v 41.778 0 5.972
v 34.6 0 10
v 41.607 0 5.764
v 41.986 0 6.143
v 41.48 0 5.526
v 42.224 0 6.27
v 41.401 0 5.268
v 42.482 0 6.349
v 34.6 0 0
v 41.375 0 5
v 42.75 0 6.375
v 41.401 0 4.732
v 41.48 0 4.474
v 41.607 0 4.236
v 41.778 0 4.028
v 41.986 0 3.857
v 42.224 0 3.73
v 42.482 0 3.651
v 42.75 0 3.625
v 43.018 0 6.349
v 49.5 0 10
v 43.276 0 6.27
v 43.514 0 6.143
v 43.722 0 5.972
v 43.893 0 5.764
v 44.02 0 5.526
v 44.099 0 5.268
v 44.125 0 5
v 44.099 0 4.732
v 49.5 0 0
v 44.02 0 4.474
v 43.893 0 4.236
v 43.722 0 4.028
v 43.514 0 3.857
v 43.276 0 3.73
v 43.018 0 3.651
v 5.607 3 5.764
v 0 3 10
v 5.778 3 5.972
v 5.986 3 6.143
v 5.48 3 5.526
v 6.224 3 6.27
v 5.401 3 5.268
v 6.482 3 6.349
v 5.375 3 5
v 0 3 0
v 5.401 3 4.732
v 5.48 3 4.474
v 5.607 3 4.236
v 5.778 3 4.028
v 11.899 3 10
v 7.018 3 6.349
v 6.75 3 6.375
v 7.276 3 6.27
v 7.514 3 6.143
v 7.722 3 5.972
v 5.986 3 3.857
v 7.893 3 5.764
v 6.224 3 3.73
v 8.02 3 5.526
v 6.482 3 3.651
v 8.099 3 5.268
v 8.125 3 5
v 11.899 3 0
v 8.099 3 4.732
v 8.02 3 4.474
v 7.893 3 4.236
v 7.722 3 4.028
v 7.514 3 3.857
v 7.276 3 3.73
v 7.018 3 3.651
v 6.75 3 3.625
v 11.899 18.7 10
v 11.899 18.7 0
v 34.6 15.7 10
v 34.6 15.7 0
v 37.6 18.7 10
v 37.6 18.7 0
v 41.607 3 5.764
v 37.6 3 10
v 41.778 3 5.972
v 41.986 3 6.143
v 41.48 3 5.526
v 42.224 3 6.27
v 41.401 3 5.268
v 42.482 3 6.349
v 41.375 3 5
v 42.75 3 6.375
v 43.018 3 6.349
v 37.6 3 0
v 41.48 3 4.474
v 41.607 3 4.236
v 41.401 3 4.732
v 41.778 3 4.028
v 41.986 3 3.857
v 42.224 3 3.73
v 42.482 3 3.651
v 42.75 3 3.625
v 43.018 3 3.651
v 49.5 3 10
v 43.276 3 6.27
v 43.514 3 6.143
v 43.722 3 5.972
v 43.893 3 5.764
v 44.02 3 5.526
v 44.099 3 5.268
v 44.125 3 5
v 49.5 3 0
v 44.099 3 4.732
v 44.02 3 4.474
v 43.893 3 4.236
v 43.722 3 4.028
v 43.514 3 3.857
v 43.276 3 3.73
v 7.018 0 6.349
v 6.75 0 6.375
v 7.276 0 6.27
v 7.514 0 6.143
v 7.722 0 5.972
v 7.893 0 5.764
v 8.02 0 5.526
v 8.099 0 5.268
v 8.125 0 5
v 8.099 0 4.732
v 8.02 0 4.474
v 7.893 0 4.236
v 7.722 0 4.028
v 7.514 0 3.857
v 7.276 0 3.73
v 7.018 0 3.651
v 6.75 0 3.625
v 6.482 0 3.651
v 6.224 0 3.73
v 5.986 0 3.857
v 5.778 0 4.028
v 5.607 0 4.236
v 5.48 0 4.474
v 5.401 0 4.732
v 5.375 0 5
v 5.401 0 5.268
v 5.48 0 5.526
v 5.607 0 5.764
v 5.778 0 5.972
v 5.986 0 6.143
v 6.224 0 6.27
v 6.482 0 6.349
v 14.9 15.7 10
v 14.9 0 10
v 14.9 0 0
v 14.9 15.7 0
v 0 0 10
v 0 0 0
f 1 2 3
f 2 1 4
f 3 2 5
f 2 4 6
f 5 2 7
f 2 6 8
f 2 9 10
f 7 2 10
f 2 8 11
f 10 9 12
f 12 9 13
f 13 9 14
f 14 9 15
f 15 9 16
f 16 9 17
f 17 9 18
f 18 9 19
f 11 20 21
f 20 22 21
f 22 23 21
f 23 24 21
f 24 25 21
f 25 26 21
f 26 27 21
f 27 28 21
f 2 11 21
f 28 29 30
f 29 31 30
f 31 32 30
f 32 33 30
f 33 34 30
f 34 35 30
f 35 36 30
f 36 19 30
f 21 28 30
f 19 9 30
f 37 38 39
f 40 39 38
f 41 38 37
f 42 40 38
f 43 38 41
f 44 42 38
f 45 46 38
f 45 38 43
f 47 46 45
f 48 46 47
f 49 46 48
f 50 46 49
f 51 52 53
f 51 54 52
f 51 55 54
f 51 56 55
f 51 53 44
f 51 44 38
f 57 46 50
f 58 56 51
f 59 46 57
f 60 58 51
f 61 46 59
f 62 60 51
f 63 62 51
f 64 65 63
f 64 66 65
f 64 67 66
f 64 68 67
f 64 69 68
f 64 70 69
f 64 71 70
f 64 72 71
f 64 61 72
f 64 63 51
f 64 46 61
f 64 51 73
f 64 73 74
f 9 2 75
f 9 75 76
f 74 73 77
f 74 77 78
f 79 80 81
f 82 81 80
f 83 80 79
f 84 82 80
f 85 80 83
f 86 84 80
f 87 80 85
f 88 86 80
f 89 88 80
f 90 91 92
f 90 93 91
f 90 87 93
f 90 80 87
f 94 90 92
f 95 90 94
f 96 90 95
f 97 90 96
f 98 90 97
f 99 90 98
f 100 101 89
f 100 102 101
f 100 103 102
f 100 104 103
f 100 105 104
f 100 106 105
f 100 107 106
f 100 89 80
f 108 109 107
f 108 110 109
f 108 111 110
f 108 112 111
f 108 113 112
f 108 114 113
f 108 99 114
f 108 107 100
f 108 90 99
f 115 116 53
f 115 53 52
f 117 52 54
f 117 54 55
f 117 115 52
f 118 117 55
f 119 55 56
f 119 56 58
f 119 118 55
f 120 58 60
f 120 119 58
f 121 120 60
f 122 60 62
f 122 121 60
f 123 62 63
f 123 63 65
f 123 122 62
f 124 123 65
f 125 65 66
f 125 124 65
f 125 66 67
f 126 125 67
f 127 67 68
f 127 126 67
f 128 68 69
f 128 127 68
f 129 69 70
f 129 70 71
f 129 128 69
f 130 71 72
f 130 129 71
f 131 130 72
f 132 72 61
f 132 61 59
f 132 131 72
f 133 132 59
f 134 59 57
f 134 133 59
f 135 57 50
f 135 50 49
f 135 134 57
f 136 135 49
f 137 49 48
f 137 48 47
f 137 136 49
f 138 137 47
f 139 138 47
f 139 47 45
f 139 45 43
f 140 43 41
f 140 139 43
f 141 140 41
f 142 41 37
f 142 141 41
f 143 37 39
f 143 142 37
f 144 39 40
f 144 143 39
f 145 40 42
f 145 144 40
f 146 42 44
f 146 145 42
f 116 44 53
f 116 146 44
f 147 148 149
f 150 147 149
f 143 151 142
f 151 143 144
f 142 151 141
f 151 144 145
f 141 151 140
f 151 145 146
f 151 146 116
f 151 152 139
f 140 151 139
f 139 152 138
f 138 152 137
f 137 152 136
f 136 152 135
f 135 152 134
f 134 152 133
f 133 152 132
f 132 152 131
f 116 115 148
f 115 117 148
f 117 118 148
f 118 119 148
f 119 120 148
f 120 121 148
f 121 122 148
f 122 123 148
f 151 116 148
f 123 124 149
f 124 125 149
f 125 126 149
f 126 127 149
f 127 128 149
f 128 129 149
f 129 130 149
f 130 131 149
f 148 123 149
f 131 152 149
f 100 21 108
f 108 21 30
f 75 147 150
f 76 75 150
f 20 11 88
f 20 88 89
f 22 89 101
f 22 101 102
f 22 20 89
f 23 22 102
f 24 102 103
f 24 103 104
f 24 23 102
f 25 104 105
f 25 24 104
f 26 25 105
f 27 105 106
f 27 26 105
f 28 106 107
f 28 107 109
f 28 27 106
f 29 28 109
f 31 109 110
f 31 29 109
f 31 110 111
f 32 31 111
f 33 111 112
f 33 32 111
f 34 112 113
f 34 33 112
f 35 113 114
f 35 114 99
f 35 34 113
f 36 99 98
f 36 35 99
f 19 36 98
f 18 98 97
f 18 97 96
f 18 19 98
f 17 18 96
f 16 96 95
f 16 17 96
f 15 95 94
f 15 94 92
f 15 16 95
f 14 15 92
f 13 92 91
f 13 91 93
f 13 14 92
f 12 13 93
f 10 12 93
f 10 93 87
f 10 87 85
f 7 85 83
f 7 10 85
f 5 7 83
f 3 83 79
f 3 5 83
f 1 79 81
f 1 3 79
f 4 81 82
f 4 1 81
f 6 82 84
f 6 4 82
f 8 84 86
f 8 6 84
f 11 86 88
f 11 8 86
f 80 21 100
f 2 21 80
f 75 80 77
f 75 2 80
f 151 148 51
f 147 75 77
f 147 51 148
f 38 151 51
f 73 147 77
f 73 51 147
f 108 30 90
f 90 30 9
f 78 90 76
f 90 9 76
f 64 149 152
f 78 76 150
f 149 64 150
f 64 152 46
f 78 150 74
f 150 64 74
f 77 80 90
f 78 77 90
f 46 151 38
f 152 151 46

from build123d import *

# Parameters (mm, degrees)
SKETCH1_W             = 11.9
SKETCH1_H             = 10
SKETCH1_R             = 1.375
BOSS_EXTRUDE1_DEPTH   = 3
SKETCH1_W_2           = 11.89875271
BOSS_EXTRUDE1_2_DEPTH = 3
SKETCH1_4_W           = 3
SKETCH1_4_H           = 10
SKETCH1_4_W_2         = 3.00124729
BOSS_EXTRUDE2_DEPTH   = 18.7
BOSS_EXTRUDE3_REACH   = 42.581
SKETCH3_W             = 10
SKETCH3_H             = 3


with BuildPart() as part:
    # Sketch1 → Boss-Extrude1 (new body)
    with BuildSketch(Plane(origin=(0, 0, 0), x_dir=(1, 0, 0), z_dir=(0, 1, 0))):
        with Locations((43.55, -5)):
            Rectangle(SKETCH1_W, SKETCH1_H)
        with Locations((42.75, -5)):
            Circle(SKETCH1_R, mode=Mode.SUBTRACT)
    extrude(amount=BOSS_EXTRUDE1_DEPTH)



with BuildPart() as body_2:
    # Sketch1 → Boss-Extrude1 2 (new body)
    with BuildSketch(Plane(origin=(0, 0, 0), x_dir=(1, 0, 0), z_dir=(0, 1, 0))):
        with Locations((5.949376355, -5)):
            Rectangle(SKETCH1_W_2, SKETCH1_H)
        with Locations((6.75, -5)):
            Circle(SKETCH1_R, mode=Mode.SUBTRACT)
    extrude(amount=BOSS_EXTRUDE1_2_DEPTH)


with BuildPart() as part_1:
    add(part.part)

    add(body_2.part)  # Boss-Extrude2 merges body 2
    # Sketch1<4> → Boss-Extrude2 (add)
    with BuildSketch(Plane(origin=(0, 0, 0), x_dir=(1, 0, 0), z_dir=(0, 1, 0))):
        with Locations((36.1, -5)):
            Rectangle(SKETCH1_4_W, SKETCH1_4_H)
        with Locations((13.399376355, -5)):
            Rectangle(SKETCH1_4_W_2, SKETCH1_4_H)
    extrude(amount=BOSS_EXTRUDE2_DEPTH)

    # Sketch3 → Boss-Extrude3 (add, up to next)
    with BuildSketch(Plane(origin=(14.9, 0, 0), x_dir=(0, 0, -1), z_dir=(1, 0, 0)), mode=Mode.PRIVATE) as boss_extrude3_sk1:
        with Locations((-5, 17.2)):
            Rectangle(SKETCH3_W, SKETCH3_H)
    boss_extrude3_tool1 = extrude(boss_extrude3_sk1.sketch, amount=BOSS_EXTRUDE3_REACH, mode=Mode.PRIVATE) - part_1.part
    add(boss_extrude3_tool1.solids().sort_by_distance((14.9, 17.2, 5))[0])


solid = part_1.part
